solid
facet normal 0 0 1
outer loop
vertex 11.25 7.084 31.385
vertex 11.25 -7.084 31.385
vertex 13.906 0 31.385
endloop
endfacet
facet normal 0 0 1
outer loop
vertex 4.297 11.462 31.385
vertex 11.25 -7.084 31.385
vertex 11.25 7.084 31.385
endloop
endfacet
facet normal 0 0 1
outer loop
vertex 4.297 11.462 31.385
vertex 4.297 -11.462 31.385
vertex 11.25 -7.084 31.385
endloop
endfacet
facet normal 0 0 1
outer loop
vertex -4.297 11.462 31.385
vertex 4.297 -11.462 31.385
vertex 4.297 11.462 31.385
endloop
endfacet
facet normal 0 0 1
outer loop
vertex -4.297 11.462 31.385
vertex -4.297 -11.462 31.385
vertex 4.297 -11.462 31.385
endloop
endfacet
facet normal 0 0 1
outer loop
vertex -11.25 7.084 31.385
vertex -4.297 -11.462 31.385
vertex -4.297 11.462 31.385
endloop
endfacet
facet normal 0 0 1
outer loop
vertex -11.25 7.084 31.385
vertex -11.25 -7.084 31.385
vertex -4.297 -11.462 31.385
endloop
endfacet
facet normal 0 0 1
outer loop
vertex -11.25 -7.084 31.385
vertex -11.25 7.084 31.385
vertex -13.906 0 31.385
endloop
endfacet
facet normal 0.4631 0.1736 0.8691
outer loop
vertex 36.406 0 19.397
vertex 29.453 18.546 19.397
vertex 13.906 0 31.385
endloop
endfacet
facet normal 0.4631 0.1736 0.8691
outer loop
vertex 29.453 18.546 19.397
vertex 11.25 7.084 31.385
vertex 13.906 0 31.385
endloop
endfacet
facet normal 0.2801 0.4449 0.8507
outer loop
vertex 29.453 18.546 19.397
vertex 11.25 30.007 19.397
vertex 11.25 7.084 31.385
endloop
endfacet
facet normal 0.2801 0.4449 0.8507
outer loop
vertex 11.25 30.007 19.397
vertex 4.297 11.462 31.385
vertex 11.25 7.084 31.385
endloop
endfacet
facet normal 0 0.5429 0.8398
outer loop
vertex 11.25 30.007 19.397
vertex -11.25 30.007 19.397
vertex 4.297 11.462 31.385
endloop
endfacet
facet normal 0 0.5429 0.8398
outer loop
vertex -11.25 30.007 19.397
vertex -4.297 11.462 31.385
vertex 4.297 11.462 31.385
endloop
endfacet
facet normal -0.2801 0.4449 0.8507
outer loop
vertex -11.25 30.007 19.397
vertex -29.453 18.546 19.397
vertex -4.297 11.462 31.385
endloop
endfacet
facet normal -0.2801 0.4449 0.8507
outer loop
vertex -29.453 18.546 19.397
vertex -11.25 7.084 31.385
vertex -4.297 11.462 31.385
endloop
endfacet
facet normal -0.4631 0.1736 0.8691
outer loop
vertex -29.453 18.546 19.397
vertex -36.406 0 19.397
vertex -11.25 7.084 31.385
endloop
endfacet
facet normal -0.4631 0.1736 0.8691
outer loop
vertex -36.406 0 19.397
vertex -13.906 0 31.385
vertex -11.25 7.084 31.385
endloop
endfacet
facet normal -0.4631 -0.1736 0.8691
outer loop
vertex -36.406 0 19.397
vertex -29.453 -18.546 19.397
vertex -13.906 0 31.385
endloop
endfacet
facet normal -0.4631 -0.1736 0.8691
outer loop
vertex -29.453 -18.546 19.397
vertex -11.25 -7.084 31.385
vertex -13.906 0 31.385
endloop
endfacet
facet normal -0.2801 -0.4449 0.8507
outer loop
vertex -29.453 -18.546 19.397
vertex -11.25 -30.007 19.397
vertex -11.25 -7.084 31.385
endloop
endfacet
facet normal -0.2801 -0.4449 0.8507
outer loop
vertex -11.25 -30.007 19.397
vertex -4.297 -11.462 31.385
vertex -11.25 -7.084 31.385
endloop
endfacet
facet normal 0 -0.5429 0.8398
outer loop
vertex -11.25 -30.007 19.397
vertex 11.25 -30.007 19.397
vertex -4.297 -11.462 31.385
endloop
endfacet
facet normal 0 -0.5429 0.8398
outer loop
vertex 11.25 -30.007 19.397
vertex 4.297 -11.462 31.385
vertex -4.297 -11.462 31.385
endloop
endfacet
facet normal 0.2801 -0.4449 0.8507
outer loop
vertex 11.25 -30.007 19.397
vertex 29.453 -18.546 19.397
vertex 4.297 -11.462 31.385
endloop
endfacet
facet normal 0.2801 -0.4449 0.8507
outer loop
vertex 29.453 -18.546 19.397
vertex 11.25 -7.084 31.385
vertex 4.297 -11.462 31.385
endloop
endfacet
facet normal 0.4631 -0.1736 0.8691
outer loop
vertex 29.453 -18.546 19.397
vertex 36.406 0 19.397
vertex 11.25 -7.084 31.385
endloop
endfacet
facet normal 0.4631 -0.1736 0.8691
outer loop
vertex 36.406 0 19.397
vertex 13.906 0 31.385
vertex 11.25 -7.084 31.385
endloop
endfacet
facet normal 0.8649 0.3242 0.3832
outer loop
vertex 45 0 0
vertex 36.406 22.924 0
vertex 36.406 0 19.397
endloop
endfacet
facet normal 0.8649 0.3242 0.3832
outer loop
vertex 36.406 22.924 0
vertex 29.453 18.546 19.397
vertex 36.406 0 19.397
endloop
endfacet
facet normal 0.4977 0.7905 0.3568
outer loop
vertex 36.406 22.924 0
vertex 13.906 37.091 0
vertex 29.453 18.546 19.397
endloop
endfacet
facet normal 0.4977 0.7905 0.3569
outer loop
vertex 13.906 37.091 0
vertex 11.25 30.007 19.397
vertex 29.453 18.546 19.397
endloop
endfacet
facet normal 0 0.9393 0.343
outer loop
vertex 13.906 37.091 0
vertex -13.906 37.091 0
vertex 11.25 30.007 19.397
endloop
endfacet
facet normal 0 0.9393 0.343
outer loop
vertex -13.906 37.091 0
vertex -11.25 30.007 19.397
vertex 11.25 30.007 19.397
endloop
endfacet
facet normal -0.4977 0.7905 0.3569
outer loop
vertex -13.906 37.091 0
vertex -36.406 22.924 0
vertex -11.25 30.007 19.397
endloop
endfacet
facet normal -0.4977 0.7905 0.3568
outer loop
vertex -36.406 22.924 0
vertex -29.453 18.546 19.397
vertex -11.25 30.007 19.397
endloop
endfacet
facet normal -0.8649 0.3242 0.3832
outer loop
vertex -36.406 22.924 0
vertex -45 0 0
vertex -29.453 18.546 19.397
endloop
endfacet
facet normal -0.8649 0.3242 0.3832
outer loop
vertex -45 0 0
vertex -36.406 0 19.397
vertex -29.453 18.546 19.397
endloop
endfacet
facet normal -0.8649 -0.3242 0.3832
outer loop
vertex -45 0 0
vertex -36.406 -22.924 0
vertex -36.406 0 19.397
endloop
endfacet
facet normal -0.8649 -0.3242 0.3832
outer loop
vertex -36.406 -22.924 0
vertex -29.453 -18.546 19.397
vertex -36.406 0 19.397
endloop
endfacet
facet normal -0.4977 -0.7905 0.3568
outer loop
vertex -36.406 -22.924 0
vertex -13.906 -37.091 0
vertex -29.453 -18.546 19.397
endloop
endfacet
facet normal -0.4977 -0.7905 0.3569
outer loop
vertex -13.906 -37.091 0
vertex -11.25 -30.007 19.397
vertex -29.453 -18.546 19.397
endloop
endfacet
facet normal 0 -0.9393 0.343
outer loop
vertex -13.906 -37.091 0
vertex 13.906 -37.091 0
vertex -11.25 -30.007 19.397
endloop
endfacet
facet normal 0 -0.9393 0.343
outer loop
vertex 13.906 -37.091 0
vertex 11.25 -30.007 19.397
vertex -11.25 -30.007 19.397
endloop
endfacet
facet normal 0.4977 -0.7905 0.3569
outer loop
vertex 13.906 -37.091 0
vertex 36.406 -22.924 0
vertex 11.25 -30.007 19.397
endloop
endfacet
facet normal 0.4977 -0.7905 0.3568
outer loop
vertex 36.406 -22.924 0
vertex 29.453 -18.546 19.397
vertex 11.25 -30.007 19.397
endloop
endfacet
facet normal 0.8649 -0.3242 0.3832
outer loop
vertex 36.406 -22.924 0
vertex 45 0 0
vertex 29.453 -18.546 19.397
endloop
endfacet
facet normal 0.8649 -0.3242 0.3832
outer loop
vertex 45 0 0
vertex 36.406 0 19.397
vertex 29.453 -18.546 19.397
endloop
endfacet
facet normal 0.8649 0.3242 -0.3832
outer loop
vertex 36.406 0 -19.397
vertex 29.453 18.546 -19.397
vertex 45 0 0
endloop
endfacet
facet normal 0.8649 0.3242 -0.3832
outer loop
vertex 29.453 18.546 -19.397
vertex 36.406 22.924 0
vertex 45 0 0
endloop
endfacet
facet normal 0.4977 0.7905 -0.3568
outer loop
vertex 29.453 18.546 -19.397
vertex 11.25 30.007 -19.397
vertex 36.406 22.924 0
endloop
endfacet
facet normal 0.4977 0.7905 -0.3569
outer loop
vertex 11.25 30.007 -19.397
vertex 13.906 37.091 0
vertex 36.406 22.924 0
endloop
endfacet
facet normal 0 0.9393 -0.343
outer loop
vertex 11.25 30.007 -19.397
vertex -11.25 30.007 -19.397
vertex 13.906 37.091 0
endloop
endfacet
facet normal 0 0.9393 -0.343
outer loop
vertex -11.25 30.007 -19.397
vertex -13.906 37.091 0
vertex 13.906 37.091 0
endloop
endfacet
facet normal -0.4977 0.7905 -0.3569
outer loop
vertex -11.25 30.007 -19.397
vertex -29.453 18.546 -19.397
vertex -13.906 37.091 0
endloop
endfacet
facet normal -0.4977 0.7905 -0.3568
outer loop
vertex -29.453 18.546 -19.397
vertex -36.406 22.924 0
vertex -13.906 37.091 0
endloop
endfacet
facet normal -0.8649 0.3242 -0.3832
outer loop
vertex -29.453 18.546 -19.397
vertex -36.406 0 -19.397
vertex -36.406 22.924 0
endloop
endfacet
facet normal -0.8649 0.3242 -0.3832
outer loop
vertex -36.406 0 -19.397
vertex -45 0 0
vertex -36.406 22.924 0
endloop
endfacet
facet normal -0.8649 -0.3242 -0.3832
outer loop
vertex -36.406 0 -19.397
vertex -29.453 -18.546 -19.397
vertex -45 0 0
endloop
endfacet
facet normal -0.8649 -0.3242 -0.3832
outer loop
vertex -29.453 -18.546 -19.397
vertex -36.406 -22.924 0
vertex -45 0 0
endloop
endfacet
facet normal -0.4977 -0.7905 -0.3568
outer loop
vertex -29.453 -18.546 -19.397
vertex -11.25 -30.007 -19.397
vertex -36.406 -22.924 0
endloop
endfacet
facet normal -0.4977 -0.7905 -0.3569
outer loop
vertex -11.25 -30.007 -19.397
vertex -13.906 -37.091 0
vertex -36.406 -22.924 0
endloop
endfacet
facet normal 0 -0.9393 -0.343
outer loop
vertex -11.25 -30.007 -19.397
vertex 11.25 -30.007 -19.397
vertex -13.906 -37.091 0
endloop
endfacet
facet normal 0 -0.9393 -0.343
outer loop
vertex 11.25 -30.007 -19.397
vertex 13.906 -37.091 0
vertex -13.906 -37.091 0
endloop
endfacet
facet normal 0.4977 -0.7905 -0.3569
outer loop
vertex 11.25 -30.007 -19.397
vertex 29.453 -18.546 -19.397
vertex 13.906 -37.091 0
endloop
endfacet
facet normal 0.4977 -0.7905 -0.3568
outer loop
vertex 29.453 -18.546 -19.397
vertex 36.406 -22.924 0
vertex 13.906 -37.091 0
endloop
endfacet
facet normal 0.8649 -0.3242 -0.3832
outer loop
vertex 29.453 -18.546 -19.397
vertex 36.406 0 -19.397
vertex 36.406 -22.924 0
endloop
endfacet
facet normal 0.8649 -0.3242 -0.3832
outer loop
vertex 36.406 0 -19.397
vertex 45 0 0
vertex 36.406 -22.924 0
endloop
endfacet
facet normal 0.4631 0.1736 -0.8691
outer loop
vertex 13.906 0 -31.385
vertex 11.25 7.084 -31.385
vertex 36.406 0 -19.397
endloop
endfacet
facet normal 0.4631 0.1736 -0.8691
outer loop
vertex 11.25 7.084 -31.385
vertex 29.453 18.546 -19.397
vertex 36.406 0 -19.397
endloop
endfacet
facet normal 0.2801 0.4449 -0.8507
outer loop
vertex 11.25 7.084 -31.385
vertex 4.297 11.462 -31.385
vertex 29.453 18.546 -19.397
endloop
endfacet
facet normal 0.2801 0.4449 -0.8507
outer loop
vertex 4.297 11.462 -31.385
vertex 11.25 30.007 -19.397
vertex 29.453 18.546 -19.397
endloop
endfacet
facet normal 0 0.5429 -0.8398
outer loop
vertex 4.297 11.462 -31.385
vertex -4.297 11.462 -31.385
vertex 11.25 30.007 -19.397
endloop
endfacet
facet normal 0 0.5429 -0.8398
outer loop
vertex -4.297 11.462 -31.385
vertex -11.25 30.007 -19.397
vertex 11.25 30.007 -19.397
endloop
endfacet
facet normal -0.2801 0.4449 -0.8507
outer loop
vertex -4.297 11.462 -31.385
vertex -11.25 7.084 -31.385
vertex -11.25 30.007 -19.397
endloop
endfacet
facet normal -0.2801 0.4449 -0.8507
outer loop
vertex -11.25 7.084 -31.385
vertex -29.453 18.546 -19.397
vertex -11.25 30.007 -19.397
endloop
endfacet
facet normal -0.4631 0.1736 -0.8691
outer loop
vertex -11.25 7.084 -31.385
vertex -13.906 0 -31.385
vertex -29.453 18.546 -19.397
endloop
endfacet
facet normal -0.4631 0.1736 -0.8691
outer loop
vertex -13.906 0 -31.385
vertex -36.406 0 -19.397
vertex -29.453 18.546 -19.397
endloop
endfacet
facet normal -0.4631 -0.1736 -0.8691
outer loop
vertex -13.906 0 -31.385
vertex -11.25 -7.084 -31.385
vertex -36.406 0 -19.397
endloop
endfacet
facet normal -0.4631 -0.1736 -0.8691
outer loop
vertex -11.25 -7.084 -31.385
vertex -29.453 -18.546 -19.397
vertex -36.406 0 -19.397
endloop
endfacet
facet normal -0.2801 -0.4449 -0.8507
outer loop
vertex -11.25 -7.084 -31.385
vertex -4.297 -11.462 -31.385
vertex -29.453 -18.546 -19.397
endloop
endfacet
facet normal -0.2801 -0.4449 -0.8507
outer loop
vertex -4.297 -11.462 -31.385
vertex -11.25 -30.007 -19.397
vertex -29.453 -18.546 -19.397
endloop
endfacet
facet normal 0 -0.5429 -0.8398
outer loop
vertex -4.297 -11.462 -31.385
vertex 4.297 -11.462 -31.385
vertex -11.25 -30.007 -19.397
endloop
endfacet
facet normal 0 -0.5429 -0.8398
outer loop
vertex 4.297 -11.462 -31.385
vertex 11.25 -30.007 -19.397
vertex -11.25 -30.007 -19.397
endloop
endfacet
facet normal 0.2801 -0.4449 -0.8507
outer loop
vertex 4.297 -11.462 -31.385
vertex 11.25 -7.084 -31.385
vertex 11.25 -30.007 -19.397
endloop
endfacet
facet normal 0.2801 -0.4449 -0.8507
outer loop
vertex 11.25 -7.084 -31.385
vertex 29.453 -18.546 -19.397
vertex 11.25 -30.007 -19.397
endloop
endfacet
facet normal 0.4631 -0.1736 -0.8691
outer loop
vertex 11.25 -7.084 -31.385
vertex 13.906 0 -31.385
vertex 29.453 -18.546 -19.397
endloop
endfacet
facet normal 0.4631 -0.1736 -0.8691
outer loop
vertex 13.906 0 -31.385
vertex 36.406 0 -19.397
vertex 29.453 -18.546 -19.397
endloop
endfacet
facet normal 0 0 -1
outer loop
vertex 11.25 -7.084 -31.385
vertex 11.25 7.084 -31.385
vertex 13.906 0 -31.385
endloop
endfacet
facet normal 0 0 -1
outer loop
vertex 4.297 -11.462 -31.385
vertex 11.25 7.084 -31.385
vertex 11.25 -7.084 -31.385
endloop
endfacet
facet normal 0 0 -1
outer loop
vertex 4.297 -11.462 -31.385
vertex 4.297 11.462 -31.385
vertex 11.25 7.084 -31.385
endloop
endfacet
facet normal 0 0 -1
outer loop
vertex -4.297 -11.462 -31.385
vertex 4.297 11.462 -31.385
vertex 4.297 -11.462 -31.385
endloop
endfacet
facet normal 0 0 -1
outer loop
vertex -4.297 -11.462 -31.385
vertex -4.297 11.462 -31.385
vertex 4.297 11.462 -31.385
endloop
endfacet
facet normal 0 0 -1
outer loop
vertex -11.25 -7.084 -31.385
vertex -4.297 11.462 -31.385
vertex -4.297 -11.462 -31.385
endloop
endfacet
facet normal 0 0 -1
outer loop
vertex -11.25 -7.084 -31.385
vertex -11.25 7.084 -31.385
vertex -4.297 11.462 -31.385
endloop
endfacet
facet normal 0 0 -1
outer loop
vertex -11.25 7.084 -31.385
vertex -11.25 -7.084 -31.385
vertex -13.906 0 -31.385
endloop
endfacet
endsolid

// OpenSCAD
// Generated by SolidPython 1.0.1 on 2020-07-29 00:46:52


scale(v = [15, 13, 11]) {
	sphere(r = 3);
}
/***********************************************
*********      SolidPython code:      **********
************************************************
 
# import packages: SolidPython
from solid import *
from solid.utils import *
from itertools import chain, combinations, permutations


class Resize:

    def __init__(self, scad_file):
        self.scad_file = scad_file
        #self.scad_file = import_scad(scad_file)
        # cone/cylinder param:
        self.r1 = 0
        self.r2 = 0
        self.h = 0
        # rectangular prism param:
        self.w = 0
        self.l = 0
        # ellipse param:
        self.r = 0

    # import OpenScad code (file name corresponds to shape)


    # classify shape + parameters
    def assign(self, param1, param2, param3):
        if self.scad_file == 'cone.scad':
            self.r1 = param1
            self.r2 = param2
            self.h = param3
        elif self.scad_file == 'cylinder.scad':
            self.r1 = param1
            self.r2 = param2
            self.h = param3
        elif self.scad_file == 'rectangularPrism.scad':
            self.h = param1
            self.l = param2
            self.w = param3
        else:
            self.r = param1
            self.h = param2

    # resize parameters
    def iterate(self):
        x = range(3, 20, 2)
        i = 1
        if self.scad_file == 'cone.scad':
            tempList = list(permutations(x, 2))
            for temp in tempList:
                param1 = temp[0]
                param2 = temp[1]
                filepath = 'produced_scad_files/' + 'cone' + str(param1) + '_' + str(param2) + '_' + '.scad'
                scad_render_to_file(cylinder(h=param1, r1=param2, r2=0), filepath)

        elif self.scad_file == 'cylinder.scad':
            tempList = list(permutations(x, 3))
            for temp in tempList:
                param1 = temp[0]
                param2 = temp[1]
                filepath = 'produced_scad_files/' + 'cylinder' + str(param1) + '_' + str(param2) + '_' + '.scad'
                scad_render_to_file(cylinder(h=param1, r1=param2, r2=param2), filepath)

        elif self.scad_file == 'rectangularPrism.scad':
            tempList = list(permutations(x, 3))
            for temp in tempList:
                param1 = temp[0]
                param2 = temp[1]
                param3 = temp[2]
                filepath = 'produced_scad_files/' + 'rectangularPrism' + str(param1) + '_' + str(param2) + '_' + str(
                    param3) + '.scad'
                scad_render_to_file(cube(size=(param1, param2, param3)), filepath)

        elif self.scad_file == 'ellipse.scad':
            tempList = list(permutations(x, 4))
            for temp in tempList:
                param1 = temp[0]
                param2 = temp[1]
                param3 = temp[2]
                param4 = temp[3]
                filepath = 'produced_scad_files/' + 'ellipse' + str(param1) + '_' + str(param2) + '_' + str(param3) + '_' + str(param4) + '.scad'
                scad_render_to_file(scale([param1, param2, param3])(sphere(r=param4)), filepath)

    def render_to_scadfile(self):
        scad_render_to_file(scad, 'example.scad') 
 
************************************************/
